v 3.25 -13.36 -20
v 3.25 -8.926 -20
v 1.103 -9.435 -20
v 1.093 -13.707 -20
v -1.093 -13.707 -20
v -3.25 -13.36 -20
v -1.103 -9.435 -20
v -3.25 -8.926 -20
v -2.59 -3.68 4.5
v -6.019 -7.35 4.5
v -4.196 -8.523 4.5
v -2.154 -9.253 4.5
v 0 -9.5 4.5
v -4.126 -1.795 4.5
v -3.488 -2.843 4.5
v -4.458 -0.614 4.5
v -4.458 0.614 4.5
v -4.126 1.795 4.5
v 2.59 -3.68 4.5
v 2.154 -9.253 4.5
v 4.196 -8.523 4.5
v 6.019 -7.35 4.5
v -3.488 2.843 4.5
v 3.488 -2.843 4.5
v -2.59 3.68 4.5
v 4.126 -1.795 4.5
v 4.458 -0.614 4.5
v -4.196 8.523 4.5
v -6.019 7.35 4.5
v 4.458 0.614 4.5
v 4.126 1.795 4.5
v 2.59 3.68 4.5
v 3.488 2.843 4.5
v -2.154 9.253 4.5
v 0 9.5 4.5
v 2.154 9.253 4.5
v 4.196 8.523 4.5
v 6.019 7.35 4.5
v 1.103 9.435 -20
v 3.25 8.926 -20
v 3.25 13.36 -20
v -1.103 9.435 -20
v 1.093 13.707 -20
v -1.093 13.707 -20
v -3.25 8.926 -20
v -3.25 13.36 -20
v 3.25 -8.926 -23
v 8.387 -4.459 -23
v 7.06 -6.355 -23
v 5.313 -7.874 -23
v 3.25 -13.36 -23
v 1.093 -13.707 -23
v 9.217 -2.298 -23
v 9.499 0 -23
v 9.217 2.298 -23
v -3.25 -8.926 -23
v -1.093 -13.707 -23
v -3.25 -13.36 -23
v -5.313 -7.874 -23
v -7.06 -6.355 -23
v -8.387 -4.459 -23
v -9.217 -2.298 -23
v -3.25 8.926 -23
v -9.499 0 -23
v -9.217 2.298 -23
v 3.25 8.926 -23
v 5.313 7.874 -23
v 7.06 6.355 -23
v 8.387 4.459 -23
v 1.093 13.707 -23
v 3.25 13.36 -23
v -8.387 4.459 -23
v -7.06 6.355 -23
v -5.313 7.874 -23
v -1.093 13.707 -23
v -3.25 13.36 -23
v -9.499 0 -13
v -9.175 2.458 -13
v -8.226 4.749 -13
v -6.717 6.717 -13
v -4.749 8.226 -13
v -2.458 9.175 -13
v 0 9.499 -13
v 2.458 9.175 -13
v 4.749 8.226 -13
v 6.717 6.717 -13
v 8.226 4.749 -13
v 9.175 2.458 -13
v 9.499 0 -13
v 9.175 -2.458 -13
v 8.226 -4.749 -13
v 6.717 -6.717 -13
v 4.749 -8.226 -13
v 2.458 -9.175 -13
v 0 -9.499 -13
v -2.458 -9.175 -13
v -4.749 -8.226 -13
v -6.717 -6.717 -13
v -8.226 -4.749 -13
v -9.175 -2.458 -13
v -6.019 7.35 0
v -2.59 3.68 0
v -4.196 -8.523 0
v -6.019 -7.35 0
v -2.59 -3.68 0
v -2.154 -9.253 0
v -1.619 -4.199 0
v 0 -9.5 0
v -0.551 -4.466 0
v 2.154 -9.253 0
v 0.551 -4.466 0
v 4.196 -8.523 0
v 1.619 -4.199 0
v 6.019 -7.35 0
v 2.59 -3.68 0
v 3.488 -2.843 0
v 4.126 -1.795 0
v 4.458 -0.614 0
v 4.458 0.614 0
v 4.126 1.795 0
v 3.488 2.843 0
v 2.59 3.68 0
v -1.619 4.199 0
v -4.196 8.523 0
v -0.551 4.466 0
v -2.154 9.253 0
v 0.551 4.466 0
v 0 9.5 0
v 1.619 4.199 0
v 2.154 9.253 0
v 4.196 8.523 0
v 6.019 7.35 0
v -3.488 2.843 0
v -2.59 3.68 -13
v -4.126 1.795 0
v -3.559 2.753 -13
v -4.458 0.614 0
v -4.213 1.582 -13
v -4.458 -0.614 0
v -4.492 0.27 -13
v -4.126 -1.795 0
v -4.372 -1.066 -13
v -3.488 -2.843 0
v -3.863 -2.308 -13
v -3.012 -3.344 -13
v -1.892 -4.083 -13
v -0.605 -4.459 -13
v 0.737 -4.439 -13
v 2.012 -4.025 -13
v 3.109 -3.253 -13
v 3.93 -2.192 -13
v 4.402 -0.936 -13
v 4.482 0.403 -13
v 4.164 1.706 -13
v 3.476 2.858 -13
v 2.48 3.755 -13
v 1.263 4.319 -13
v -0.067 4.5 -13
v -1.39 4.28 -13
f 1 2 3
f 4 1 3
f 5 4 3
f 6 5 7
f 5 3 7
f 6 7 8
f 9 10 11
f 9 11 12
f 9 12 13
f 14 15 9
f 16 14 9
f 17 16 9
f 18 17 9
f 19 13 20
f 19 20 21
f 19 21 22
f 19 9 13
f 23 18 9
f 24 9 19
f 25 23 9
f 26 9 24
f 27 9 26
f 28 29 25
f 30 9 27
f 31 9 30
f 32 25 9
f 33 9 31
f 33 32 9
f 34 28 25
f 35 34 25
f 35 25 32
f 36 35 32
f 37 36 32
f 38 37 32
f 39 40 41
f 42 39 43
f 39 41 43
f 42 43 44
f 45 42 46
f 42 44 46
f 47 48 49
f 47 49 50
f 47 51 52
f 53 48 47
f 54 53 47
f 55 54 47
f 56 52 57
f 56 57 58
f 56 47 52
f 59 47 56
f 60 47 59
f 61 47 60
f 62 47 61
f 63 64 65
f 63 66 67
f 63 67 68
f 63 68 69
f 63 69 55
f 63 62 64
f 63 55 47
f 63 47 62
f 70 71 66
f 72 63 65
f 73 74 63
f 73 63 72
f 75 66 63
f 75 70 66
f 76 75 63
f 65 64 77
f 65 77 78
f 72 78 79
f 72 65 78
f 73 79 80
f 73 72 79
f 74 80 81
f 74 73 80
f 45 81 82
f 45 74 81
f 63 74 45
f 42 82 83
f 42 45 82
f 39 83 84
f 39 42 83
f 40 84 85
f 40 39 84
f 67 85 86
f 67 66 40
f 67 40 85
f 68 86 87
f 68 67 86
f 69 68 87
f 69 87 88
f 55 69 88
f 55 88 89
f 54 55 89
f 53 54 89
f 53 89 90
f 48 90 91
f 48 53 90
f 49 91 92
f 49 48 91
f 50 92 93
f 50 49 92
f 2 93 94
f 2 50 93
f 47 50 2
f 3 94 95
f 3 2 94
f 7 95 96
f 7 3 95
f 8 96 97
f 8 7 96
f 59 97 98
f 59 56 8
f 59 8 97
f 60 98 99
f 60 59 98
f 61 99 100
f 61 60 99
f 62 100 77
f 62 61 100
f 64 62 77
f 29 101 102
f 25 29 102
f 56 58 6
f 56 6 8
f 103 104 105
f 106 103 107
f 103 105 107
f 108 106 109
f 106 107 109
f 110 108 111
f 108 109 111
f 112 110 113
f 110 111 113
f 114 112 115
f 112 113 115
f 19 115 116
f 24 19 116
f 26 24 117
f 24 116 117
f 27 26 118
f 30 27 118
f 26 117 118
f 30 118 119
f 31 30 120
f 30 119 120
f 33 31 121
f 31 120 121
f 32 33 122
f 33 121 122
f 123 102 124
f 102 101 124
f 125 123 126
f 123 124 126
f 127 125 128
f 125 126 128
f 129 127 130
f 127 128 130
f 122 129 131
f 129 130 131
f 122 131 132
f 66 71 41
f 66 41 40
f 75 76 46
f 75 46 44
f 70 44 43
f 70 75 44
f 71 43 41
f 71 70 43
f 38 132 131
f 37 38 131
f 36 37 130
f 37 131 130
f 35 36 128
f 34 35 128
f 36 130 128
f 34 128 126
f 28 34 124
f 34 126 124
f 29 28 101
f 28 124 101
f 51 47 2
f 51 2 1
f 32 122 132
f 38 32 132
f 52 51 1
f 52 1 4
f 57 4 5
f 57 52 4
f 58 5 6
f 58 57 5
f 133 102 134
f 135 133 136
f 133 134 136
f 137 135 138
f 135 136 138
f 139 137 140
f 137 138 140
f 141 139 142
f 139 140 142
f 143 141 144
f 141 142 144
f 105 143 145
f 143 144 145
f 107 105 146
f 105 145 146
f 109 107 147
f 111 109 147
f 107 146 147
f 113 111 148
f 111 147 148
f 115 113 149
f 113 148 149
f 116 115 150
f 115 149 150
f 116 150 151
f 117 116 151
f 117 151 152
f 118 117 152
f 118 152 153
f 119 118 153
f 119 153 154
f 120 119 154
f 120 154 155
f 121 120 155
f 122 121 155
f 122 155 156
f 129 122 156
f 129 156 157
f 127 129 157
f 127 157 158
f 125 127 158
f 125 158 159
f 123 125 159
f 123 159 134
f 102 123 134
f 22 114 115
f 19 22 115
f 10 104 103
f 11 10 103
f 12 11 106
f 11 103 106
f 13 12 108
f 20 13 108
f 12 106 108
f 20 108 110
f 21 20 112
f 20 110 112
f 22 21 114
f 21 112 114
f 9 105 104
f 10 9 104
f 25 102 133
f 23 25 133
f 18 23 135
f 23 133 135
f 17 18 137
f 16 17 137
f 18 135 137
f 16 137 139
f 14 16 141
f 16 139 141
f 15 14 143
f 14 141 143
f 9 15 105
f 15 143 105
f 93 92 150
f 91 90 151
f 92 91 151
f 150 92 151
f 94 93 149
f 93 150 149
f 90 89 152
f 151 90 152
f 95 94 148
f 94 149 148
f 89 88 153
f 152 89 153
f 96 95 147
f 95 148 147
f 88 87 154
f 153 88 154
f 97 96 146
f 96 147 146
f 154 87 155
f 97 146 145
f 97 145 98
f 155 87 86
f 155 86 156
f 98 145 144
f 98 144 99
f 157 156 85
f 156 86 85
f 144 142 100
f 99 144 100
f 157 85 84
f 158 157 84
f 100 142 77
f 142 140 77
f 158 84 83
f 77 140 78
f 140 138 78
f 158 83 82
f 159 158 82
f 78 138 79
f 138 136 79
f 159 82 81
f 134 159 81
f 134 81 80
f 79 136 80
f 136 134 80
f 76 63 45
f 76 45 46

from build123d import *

# Parameters (mm, degrees)
BOSS_EXTRUDE1_DEPTH = 4.5
BOSS_EXTRUDE2_START = -23
BOSS_EXTRUDE2_DEPTH = 23
BOSS_EXTRUDE3_DEPTH = 10
BOSS_EXTRUDE4_DEPTH = 3


with BuildPart() as part:
    # Sketch1 → Boss-Extrude1 (new body)
    with BuildSketch(Plane.XY):
        with BuildLine():
            Line((2.589777271, 3.680088815), (6.019261146, 7.349727563))
            ThreePointArc((6.019261146, 7.349727563), (0, 9.5), (-6.019261146, 7.349727563))
            Line((-6.019261146, 7.349727563), (-2.589777271, 3.680088815))
            ThreePointArc((-2.589777271, 3.680088815), (-4.5, 0), (-2.589777271, -3.680088815))
            Line((-2.589777271, -3.680088815), (-6.019261146, -7.349727563))
            ThreePointArc((-6.019261146, -7.349727563), (0, -9.5), (6.019261146, -7.349727563))
            Line((6.019261146, -7.349727563), (2.589777271, -3.680088815))
            ThreePointArc((2.589777271, -3.680088815), (4.5, 0), (2.589777271, 3.680088815))
        make_face()
    extrude(amount=BOSS_EXTRUDE1_DEPTH)

    # Sketch1<3> → Boss-Extrude2 (add)
    with BuildSketch(Plane.XY.offset(BOSS_EXTRUDE2_START)):
        with BuildLine():
            ThreePointArc((4.5, 0), (3.99399535, 2.073162112), (2.589777271, 3.680088815))
            ThreePointArc((2.589777271, 3.680088815), (0, 4.5), (-2.589777271, 3.680088815))
            ThreePointArc((-2.589777271, 3.680088815), (-4.5, 0), (-2.589777271, -3.680088815))
            ThreePointArc((-2.589777271, -3.680088815), (0, -4.5), (2.589777271, -3.680088815))
            ThreePointArc((2.589777271, -3.680088815), (3.99399535, -2.073162112), (4.5, 0))
        make_face()
    extrude(amount=BOSS_EXTRUDE2_DEPTH)

    # Sketch2 → Boss-Extrude3 (add)
    with BuildSketch(Plane(origin=(0, 0, -23), x_dir=(-1, 0, 0), z_dir=(0, 0, -1))):
        with BuildLine():
            ThreePointArc((-3.25, 8.92561653), (-9.498901539, 0), (-3.25, -8.92561653))
            ThreePointArc((-3.25, -8.92561653), (0, -9.498901539), (3.25, -8.92561653))
            ThreePointArc((3.25, -8.92561653), (7.781406057, -5.447829864), (9.498901539, 0))
            ThreePointArc((9.498901539, 0), (7.781406057, 5.447829864), (3.25, 8.92561653))
            ThreePointArc((3.25, 8.92561653), (0, 9.498901539), (-3.25, 8.92561653))
        make_face()
    extrude(amount=-BOSS_EXTRUDE3_DEPTH)

    # Sketch2<3> → Boss-Extrude4 (add)
    with BuildSketch(Plane(origin=(0, 0, -23), x_dir=(-1, 0, 0), z_dir=(0, 0, -1))):
        with BuildLine():
            ThreePointArc((3.25, -8.92561653), (0, -9.498901539), (-3.25, -8.92561653))
            Line((-3.25, -8.92561653), (-3.25, -13.360389216))
            ThreePointArc((-3.25, -13.360389216), (0, -13.75), (3.25, -13.360389216))
            Line((3.25, -13.360389216), (3.25, -8.92561653))
        make_face()
        with BuildLine():
            Line((-3.25, 13.360389216), (-3.25, 8.92561653))
            ThreePointArc((-3.25, 8.92561653), (0, 9.498901539), (3.25, 8.92561653))
            Line((3.25, 8.92561653), (3.25, 13.360389216))
            ThreePointArc((3.25, 13.360389216), (0, 13.75), (-3.25, 13.360389216))
        make_face()
    extrude(amount=-BOSS_EXTRUDE4_DEPTH)


solid = part.part
